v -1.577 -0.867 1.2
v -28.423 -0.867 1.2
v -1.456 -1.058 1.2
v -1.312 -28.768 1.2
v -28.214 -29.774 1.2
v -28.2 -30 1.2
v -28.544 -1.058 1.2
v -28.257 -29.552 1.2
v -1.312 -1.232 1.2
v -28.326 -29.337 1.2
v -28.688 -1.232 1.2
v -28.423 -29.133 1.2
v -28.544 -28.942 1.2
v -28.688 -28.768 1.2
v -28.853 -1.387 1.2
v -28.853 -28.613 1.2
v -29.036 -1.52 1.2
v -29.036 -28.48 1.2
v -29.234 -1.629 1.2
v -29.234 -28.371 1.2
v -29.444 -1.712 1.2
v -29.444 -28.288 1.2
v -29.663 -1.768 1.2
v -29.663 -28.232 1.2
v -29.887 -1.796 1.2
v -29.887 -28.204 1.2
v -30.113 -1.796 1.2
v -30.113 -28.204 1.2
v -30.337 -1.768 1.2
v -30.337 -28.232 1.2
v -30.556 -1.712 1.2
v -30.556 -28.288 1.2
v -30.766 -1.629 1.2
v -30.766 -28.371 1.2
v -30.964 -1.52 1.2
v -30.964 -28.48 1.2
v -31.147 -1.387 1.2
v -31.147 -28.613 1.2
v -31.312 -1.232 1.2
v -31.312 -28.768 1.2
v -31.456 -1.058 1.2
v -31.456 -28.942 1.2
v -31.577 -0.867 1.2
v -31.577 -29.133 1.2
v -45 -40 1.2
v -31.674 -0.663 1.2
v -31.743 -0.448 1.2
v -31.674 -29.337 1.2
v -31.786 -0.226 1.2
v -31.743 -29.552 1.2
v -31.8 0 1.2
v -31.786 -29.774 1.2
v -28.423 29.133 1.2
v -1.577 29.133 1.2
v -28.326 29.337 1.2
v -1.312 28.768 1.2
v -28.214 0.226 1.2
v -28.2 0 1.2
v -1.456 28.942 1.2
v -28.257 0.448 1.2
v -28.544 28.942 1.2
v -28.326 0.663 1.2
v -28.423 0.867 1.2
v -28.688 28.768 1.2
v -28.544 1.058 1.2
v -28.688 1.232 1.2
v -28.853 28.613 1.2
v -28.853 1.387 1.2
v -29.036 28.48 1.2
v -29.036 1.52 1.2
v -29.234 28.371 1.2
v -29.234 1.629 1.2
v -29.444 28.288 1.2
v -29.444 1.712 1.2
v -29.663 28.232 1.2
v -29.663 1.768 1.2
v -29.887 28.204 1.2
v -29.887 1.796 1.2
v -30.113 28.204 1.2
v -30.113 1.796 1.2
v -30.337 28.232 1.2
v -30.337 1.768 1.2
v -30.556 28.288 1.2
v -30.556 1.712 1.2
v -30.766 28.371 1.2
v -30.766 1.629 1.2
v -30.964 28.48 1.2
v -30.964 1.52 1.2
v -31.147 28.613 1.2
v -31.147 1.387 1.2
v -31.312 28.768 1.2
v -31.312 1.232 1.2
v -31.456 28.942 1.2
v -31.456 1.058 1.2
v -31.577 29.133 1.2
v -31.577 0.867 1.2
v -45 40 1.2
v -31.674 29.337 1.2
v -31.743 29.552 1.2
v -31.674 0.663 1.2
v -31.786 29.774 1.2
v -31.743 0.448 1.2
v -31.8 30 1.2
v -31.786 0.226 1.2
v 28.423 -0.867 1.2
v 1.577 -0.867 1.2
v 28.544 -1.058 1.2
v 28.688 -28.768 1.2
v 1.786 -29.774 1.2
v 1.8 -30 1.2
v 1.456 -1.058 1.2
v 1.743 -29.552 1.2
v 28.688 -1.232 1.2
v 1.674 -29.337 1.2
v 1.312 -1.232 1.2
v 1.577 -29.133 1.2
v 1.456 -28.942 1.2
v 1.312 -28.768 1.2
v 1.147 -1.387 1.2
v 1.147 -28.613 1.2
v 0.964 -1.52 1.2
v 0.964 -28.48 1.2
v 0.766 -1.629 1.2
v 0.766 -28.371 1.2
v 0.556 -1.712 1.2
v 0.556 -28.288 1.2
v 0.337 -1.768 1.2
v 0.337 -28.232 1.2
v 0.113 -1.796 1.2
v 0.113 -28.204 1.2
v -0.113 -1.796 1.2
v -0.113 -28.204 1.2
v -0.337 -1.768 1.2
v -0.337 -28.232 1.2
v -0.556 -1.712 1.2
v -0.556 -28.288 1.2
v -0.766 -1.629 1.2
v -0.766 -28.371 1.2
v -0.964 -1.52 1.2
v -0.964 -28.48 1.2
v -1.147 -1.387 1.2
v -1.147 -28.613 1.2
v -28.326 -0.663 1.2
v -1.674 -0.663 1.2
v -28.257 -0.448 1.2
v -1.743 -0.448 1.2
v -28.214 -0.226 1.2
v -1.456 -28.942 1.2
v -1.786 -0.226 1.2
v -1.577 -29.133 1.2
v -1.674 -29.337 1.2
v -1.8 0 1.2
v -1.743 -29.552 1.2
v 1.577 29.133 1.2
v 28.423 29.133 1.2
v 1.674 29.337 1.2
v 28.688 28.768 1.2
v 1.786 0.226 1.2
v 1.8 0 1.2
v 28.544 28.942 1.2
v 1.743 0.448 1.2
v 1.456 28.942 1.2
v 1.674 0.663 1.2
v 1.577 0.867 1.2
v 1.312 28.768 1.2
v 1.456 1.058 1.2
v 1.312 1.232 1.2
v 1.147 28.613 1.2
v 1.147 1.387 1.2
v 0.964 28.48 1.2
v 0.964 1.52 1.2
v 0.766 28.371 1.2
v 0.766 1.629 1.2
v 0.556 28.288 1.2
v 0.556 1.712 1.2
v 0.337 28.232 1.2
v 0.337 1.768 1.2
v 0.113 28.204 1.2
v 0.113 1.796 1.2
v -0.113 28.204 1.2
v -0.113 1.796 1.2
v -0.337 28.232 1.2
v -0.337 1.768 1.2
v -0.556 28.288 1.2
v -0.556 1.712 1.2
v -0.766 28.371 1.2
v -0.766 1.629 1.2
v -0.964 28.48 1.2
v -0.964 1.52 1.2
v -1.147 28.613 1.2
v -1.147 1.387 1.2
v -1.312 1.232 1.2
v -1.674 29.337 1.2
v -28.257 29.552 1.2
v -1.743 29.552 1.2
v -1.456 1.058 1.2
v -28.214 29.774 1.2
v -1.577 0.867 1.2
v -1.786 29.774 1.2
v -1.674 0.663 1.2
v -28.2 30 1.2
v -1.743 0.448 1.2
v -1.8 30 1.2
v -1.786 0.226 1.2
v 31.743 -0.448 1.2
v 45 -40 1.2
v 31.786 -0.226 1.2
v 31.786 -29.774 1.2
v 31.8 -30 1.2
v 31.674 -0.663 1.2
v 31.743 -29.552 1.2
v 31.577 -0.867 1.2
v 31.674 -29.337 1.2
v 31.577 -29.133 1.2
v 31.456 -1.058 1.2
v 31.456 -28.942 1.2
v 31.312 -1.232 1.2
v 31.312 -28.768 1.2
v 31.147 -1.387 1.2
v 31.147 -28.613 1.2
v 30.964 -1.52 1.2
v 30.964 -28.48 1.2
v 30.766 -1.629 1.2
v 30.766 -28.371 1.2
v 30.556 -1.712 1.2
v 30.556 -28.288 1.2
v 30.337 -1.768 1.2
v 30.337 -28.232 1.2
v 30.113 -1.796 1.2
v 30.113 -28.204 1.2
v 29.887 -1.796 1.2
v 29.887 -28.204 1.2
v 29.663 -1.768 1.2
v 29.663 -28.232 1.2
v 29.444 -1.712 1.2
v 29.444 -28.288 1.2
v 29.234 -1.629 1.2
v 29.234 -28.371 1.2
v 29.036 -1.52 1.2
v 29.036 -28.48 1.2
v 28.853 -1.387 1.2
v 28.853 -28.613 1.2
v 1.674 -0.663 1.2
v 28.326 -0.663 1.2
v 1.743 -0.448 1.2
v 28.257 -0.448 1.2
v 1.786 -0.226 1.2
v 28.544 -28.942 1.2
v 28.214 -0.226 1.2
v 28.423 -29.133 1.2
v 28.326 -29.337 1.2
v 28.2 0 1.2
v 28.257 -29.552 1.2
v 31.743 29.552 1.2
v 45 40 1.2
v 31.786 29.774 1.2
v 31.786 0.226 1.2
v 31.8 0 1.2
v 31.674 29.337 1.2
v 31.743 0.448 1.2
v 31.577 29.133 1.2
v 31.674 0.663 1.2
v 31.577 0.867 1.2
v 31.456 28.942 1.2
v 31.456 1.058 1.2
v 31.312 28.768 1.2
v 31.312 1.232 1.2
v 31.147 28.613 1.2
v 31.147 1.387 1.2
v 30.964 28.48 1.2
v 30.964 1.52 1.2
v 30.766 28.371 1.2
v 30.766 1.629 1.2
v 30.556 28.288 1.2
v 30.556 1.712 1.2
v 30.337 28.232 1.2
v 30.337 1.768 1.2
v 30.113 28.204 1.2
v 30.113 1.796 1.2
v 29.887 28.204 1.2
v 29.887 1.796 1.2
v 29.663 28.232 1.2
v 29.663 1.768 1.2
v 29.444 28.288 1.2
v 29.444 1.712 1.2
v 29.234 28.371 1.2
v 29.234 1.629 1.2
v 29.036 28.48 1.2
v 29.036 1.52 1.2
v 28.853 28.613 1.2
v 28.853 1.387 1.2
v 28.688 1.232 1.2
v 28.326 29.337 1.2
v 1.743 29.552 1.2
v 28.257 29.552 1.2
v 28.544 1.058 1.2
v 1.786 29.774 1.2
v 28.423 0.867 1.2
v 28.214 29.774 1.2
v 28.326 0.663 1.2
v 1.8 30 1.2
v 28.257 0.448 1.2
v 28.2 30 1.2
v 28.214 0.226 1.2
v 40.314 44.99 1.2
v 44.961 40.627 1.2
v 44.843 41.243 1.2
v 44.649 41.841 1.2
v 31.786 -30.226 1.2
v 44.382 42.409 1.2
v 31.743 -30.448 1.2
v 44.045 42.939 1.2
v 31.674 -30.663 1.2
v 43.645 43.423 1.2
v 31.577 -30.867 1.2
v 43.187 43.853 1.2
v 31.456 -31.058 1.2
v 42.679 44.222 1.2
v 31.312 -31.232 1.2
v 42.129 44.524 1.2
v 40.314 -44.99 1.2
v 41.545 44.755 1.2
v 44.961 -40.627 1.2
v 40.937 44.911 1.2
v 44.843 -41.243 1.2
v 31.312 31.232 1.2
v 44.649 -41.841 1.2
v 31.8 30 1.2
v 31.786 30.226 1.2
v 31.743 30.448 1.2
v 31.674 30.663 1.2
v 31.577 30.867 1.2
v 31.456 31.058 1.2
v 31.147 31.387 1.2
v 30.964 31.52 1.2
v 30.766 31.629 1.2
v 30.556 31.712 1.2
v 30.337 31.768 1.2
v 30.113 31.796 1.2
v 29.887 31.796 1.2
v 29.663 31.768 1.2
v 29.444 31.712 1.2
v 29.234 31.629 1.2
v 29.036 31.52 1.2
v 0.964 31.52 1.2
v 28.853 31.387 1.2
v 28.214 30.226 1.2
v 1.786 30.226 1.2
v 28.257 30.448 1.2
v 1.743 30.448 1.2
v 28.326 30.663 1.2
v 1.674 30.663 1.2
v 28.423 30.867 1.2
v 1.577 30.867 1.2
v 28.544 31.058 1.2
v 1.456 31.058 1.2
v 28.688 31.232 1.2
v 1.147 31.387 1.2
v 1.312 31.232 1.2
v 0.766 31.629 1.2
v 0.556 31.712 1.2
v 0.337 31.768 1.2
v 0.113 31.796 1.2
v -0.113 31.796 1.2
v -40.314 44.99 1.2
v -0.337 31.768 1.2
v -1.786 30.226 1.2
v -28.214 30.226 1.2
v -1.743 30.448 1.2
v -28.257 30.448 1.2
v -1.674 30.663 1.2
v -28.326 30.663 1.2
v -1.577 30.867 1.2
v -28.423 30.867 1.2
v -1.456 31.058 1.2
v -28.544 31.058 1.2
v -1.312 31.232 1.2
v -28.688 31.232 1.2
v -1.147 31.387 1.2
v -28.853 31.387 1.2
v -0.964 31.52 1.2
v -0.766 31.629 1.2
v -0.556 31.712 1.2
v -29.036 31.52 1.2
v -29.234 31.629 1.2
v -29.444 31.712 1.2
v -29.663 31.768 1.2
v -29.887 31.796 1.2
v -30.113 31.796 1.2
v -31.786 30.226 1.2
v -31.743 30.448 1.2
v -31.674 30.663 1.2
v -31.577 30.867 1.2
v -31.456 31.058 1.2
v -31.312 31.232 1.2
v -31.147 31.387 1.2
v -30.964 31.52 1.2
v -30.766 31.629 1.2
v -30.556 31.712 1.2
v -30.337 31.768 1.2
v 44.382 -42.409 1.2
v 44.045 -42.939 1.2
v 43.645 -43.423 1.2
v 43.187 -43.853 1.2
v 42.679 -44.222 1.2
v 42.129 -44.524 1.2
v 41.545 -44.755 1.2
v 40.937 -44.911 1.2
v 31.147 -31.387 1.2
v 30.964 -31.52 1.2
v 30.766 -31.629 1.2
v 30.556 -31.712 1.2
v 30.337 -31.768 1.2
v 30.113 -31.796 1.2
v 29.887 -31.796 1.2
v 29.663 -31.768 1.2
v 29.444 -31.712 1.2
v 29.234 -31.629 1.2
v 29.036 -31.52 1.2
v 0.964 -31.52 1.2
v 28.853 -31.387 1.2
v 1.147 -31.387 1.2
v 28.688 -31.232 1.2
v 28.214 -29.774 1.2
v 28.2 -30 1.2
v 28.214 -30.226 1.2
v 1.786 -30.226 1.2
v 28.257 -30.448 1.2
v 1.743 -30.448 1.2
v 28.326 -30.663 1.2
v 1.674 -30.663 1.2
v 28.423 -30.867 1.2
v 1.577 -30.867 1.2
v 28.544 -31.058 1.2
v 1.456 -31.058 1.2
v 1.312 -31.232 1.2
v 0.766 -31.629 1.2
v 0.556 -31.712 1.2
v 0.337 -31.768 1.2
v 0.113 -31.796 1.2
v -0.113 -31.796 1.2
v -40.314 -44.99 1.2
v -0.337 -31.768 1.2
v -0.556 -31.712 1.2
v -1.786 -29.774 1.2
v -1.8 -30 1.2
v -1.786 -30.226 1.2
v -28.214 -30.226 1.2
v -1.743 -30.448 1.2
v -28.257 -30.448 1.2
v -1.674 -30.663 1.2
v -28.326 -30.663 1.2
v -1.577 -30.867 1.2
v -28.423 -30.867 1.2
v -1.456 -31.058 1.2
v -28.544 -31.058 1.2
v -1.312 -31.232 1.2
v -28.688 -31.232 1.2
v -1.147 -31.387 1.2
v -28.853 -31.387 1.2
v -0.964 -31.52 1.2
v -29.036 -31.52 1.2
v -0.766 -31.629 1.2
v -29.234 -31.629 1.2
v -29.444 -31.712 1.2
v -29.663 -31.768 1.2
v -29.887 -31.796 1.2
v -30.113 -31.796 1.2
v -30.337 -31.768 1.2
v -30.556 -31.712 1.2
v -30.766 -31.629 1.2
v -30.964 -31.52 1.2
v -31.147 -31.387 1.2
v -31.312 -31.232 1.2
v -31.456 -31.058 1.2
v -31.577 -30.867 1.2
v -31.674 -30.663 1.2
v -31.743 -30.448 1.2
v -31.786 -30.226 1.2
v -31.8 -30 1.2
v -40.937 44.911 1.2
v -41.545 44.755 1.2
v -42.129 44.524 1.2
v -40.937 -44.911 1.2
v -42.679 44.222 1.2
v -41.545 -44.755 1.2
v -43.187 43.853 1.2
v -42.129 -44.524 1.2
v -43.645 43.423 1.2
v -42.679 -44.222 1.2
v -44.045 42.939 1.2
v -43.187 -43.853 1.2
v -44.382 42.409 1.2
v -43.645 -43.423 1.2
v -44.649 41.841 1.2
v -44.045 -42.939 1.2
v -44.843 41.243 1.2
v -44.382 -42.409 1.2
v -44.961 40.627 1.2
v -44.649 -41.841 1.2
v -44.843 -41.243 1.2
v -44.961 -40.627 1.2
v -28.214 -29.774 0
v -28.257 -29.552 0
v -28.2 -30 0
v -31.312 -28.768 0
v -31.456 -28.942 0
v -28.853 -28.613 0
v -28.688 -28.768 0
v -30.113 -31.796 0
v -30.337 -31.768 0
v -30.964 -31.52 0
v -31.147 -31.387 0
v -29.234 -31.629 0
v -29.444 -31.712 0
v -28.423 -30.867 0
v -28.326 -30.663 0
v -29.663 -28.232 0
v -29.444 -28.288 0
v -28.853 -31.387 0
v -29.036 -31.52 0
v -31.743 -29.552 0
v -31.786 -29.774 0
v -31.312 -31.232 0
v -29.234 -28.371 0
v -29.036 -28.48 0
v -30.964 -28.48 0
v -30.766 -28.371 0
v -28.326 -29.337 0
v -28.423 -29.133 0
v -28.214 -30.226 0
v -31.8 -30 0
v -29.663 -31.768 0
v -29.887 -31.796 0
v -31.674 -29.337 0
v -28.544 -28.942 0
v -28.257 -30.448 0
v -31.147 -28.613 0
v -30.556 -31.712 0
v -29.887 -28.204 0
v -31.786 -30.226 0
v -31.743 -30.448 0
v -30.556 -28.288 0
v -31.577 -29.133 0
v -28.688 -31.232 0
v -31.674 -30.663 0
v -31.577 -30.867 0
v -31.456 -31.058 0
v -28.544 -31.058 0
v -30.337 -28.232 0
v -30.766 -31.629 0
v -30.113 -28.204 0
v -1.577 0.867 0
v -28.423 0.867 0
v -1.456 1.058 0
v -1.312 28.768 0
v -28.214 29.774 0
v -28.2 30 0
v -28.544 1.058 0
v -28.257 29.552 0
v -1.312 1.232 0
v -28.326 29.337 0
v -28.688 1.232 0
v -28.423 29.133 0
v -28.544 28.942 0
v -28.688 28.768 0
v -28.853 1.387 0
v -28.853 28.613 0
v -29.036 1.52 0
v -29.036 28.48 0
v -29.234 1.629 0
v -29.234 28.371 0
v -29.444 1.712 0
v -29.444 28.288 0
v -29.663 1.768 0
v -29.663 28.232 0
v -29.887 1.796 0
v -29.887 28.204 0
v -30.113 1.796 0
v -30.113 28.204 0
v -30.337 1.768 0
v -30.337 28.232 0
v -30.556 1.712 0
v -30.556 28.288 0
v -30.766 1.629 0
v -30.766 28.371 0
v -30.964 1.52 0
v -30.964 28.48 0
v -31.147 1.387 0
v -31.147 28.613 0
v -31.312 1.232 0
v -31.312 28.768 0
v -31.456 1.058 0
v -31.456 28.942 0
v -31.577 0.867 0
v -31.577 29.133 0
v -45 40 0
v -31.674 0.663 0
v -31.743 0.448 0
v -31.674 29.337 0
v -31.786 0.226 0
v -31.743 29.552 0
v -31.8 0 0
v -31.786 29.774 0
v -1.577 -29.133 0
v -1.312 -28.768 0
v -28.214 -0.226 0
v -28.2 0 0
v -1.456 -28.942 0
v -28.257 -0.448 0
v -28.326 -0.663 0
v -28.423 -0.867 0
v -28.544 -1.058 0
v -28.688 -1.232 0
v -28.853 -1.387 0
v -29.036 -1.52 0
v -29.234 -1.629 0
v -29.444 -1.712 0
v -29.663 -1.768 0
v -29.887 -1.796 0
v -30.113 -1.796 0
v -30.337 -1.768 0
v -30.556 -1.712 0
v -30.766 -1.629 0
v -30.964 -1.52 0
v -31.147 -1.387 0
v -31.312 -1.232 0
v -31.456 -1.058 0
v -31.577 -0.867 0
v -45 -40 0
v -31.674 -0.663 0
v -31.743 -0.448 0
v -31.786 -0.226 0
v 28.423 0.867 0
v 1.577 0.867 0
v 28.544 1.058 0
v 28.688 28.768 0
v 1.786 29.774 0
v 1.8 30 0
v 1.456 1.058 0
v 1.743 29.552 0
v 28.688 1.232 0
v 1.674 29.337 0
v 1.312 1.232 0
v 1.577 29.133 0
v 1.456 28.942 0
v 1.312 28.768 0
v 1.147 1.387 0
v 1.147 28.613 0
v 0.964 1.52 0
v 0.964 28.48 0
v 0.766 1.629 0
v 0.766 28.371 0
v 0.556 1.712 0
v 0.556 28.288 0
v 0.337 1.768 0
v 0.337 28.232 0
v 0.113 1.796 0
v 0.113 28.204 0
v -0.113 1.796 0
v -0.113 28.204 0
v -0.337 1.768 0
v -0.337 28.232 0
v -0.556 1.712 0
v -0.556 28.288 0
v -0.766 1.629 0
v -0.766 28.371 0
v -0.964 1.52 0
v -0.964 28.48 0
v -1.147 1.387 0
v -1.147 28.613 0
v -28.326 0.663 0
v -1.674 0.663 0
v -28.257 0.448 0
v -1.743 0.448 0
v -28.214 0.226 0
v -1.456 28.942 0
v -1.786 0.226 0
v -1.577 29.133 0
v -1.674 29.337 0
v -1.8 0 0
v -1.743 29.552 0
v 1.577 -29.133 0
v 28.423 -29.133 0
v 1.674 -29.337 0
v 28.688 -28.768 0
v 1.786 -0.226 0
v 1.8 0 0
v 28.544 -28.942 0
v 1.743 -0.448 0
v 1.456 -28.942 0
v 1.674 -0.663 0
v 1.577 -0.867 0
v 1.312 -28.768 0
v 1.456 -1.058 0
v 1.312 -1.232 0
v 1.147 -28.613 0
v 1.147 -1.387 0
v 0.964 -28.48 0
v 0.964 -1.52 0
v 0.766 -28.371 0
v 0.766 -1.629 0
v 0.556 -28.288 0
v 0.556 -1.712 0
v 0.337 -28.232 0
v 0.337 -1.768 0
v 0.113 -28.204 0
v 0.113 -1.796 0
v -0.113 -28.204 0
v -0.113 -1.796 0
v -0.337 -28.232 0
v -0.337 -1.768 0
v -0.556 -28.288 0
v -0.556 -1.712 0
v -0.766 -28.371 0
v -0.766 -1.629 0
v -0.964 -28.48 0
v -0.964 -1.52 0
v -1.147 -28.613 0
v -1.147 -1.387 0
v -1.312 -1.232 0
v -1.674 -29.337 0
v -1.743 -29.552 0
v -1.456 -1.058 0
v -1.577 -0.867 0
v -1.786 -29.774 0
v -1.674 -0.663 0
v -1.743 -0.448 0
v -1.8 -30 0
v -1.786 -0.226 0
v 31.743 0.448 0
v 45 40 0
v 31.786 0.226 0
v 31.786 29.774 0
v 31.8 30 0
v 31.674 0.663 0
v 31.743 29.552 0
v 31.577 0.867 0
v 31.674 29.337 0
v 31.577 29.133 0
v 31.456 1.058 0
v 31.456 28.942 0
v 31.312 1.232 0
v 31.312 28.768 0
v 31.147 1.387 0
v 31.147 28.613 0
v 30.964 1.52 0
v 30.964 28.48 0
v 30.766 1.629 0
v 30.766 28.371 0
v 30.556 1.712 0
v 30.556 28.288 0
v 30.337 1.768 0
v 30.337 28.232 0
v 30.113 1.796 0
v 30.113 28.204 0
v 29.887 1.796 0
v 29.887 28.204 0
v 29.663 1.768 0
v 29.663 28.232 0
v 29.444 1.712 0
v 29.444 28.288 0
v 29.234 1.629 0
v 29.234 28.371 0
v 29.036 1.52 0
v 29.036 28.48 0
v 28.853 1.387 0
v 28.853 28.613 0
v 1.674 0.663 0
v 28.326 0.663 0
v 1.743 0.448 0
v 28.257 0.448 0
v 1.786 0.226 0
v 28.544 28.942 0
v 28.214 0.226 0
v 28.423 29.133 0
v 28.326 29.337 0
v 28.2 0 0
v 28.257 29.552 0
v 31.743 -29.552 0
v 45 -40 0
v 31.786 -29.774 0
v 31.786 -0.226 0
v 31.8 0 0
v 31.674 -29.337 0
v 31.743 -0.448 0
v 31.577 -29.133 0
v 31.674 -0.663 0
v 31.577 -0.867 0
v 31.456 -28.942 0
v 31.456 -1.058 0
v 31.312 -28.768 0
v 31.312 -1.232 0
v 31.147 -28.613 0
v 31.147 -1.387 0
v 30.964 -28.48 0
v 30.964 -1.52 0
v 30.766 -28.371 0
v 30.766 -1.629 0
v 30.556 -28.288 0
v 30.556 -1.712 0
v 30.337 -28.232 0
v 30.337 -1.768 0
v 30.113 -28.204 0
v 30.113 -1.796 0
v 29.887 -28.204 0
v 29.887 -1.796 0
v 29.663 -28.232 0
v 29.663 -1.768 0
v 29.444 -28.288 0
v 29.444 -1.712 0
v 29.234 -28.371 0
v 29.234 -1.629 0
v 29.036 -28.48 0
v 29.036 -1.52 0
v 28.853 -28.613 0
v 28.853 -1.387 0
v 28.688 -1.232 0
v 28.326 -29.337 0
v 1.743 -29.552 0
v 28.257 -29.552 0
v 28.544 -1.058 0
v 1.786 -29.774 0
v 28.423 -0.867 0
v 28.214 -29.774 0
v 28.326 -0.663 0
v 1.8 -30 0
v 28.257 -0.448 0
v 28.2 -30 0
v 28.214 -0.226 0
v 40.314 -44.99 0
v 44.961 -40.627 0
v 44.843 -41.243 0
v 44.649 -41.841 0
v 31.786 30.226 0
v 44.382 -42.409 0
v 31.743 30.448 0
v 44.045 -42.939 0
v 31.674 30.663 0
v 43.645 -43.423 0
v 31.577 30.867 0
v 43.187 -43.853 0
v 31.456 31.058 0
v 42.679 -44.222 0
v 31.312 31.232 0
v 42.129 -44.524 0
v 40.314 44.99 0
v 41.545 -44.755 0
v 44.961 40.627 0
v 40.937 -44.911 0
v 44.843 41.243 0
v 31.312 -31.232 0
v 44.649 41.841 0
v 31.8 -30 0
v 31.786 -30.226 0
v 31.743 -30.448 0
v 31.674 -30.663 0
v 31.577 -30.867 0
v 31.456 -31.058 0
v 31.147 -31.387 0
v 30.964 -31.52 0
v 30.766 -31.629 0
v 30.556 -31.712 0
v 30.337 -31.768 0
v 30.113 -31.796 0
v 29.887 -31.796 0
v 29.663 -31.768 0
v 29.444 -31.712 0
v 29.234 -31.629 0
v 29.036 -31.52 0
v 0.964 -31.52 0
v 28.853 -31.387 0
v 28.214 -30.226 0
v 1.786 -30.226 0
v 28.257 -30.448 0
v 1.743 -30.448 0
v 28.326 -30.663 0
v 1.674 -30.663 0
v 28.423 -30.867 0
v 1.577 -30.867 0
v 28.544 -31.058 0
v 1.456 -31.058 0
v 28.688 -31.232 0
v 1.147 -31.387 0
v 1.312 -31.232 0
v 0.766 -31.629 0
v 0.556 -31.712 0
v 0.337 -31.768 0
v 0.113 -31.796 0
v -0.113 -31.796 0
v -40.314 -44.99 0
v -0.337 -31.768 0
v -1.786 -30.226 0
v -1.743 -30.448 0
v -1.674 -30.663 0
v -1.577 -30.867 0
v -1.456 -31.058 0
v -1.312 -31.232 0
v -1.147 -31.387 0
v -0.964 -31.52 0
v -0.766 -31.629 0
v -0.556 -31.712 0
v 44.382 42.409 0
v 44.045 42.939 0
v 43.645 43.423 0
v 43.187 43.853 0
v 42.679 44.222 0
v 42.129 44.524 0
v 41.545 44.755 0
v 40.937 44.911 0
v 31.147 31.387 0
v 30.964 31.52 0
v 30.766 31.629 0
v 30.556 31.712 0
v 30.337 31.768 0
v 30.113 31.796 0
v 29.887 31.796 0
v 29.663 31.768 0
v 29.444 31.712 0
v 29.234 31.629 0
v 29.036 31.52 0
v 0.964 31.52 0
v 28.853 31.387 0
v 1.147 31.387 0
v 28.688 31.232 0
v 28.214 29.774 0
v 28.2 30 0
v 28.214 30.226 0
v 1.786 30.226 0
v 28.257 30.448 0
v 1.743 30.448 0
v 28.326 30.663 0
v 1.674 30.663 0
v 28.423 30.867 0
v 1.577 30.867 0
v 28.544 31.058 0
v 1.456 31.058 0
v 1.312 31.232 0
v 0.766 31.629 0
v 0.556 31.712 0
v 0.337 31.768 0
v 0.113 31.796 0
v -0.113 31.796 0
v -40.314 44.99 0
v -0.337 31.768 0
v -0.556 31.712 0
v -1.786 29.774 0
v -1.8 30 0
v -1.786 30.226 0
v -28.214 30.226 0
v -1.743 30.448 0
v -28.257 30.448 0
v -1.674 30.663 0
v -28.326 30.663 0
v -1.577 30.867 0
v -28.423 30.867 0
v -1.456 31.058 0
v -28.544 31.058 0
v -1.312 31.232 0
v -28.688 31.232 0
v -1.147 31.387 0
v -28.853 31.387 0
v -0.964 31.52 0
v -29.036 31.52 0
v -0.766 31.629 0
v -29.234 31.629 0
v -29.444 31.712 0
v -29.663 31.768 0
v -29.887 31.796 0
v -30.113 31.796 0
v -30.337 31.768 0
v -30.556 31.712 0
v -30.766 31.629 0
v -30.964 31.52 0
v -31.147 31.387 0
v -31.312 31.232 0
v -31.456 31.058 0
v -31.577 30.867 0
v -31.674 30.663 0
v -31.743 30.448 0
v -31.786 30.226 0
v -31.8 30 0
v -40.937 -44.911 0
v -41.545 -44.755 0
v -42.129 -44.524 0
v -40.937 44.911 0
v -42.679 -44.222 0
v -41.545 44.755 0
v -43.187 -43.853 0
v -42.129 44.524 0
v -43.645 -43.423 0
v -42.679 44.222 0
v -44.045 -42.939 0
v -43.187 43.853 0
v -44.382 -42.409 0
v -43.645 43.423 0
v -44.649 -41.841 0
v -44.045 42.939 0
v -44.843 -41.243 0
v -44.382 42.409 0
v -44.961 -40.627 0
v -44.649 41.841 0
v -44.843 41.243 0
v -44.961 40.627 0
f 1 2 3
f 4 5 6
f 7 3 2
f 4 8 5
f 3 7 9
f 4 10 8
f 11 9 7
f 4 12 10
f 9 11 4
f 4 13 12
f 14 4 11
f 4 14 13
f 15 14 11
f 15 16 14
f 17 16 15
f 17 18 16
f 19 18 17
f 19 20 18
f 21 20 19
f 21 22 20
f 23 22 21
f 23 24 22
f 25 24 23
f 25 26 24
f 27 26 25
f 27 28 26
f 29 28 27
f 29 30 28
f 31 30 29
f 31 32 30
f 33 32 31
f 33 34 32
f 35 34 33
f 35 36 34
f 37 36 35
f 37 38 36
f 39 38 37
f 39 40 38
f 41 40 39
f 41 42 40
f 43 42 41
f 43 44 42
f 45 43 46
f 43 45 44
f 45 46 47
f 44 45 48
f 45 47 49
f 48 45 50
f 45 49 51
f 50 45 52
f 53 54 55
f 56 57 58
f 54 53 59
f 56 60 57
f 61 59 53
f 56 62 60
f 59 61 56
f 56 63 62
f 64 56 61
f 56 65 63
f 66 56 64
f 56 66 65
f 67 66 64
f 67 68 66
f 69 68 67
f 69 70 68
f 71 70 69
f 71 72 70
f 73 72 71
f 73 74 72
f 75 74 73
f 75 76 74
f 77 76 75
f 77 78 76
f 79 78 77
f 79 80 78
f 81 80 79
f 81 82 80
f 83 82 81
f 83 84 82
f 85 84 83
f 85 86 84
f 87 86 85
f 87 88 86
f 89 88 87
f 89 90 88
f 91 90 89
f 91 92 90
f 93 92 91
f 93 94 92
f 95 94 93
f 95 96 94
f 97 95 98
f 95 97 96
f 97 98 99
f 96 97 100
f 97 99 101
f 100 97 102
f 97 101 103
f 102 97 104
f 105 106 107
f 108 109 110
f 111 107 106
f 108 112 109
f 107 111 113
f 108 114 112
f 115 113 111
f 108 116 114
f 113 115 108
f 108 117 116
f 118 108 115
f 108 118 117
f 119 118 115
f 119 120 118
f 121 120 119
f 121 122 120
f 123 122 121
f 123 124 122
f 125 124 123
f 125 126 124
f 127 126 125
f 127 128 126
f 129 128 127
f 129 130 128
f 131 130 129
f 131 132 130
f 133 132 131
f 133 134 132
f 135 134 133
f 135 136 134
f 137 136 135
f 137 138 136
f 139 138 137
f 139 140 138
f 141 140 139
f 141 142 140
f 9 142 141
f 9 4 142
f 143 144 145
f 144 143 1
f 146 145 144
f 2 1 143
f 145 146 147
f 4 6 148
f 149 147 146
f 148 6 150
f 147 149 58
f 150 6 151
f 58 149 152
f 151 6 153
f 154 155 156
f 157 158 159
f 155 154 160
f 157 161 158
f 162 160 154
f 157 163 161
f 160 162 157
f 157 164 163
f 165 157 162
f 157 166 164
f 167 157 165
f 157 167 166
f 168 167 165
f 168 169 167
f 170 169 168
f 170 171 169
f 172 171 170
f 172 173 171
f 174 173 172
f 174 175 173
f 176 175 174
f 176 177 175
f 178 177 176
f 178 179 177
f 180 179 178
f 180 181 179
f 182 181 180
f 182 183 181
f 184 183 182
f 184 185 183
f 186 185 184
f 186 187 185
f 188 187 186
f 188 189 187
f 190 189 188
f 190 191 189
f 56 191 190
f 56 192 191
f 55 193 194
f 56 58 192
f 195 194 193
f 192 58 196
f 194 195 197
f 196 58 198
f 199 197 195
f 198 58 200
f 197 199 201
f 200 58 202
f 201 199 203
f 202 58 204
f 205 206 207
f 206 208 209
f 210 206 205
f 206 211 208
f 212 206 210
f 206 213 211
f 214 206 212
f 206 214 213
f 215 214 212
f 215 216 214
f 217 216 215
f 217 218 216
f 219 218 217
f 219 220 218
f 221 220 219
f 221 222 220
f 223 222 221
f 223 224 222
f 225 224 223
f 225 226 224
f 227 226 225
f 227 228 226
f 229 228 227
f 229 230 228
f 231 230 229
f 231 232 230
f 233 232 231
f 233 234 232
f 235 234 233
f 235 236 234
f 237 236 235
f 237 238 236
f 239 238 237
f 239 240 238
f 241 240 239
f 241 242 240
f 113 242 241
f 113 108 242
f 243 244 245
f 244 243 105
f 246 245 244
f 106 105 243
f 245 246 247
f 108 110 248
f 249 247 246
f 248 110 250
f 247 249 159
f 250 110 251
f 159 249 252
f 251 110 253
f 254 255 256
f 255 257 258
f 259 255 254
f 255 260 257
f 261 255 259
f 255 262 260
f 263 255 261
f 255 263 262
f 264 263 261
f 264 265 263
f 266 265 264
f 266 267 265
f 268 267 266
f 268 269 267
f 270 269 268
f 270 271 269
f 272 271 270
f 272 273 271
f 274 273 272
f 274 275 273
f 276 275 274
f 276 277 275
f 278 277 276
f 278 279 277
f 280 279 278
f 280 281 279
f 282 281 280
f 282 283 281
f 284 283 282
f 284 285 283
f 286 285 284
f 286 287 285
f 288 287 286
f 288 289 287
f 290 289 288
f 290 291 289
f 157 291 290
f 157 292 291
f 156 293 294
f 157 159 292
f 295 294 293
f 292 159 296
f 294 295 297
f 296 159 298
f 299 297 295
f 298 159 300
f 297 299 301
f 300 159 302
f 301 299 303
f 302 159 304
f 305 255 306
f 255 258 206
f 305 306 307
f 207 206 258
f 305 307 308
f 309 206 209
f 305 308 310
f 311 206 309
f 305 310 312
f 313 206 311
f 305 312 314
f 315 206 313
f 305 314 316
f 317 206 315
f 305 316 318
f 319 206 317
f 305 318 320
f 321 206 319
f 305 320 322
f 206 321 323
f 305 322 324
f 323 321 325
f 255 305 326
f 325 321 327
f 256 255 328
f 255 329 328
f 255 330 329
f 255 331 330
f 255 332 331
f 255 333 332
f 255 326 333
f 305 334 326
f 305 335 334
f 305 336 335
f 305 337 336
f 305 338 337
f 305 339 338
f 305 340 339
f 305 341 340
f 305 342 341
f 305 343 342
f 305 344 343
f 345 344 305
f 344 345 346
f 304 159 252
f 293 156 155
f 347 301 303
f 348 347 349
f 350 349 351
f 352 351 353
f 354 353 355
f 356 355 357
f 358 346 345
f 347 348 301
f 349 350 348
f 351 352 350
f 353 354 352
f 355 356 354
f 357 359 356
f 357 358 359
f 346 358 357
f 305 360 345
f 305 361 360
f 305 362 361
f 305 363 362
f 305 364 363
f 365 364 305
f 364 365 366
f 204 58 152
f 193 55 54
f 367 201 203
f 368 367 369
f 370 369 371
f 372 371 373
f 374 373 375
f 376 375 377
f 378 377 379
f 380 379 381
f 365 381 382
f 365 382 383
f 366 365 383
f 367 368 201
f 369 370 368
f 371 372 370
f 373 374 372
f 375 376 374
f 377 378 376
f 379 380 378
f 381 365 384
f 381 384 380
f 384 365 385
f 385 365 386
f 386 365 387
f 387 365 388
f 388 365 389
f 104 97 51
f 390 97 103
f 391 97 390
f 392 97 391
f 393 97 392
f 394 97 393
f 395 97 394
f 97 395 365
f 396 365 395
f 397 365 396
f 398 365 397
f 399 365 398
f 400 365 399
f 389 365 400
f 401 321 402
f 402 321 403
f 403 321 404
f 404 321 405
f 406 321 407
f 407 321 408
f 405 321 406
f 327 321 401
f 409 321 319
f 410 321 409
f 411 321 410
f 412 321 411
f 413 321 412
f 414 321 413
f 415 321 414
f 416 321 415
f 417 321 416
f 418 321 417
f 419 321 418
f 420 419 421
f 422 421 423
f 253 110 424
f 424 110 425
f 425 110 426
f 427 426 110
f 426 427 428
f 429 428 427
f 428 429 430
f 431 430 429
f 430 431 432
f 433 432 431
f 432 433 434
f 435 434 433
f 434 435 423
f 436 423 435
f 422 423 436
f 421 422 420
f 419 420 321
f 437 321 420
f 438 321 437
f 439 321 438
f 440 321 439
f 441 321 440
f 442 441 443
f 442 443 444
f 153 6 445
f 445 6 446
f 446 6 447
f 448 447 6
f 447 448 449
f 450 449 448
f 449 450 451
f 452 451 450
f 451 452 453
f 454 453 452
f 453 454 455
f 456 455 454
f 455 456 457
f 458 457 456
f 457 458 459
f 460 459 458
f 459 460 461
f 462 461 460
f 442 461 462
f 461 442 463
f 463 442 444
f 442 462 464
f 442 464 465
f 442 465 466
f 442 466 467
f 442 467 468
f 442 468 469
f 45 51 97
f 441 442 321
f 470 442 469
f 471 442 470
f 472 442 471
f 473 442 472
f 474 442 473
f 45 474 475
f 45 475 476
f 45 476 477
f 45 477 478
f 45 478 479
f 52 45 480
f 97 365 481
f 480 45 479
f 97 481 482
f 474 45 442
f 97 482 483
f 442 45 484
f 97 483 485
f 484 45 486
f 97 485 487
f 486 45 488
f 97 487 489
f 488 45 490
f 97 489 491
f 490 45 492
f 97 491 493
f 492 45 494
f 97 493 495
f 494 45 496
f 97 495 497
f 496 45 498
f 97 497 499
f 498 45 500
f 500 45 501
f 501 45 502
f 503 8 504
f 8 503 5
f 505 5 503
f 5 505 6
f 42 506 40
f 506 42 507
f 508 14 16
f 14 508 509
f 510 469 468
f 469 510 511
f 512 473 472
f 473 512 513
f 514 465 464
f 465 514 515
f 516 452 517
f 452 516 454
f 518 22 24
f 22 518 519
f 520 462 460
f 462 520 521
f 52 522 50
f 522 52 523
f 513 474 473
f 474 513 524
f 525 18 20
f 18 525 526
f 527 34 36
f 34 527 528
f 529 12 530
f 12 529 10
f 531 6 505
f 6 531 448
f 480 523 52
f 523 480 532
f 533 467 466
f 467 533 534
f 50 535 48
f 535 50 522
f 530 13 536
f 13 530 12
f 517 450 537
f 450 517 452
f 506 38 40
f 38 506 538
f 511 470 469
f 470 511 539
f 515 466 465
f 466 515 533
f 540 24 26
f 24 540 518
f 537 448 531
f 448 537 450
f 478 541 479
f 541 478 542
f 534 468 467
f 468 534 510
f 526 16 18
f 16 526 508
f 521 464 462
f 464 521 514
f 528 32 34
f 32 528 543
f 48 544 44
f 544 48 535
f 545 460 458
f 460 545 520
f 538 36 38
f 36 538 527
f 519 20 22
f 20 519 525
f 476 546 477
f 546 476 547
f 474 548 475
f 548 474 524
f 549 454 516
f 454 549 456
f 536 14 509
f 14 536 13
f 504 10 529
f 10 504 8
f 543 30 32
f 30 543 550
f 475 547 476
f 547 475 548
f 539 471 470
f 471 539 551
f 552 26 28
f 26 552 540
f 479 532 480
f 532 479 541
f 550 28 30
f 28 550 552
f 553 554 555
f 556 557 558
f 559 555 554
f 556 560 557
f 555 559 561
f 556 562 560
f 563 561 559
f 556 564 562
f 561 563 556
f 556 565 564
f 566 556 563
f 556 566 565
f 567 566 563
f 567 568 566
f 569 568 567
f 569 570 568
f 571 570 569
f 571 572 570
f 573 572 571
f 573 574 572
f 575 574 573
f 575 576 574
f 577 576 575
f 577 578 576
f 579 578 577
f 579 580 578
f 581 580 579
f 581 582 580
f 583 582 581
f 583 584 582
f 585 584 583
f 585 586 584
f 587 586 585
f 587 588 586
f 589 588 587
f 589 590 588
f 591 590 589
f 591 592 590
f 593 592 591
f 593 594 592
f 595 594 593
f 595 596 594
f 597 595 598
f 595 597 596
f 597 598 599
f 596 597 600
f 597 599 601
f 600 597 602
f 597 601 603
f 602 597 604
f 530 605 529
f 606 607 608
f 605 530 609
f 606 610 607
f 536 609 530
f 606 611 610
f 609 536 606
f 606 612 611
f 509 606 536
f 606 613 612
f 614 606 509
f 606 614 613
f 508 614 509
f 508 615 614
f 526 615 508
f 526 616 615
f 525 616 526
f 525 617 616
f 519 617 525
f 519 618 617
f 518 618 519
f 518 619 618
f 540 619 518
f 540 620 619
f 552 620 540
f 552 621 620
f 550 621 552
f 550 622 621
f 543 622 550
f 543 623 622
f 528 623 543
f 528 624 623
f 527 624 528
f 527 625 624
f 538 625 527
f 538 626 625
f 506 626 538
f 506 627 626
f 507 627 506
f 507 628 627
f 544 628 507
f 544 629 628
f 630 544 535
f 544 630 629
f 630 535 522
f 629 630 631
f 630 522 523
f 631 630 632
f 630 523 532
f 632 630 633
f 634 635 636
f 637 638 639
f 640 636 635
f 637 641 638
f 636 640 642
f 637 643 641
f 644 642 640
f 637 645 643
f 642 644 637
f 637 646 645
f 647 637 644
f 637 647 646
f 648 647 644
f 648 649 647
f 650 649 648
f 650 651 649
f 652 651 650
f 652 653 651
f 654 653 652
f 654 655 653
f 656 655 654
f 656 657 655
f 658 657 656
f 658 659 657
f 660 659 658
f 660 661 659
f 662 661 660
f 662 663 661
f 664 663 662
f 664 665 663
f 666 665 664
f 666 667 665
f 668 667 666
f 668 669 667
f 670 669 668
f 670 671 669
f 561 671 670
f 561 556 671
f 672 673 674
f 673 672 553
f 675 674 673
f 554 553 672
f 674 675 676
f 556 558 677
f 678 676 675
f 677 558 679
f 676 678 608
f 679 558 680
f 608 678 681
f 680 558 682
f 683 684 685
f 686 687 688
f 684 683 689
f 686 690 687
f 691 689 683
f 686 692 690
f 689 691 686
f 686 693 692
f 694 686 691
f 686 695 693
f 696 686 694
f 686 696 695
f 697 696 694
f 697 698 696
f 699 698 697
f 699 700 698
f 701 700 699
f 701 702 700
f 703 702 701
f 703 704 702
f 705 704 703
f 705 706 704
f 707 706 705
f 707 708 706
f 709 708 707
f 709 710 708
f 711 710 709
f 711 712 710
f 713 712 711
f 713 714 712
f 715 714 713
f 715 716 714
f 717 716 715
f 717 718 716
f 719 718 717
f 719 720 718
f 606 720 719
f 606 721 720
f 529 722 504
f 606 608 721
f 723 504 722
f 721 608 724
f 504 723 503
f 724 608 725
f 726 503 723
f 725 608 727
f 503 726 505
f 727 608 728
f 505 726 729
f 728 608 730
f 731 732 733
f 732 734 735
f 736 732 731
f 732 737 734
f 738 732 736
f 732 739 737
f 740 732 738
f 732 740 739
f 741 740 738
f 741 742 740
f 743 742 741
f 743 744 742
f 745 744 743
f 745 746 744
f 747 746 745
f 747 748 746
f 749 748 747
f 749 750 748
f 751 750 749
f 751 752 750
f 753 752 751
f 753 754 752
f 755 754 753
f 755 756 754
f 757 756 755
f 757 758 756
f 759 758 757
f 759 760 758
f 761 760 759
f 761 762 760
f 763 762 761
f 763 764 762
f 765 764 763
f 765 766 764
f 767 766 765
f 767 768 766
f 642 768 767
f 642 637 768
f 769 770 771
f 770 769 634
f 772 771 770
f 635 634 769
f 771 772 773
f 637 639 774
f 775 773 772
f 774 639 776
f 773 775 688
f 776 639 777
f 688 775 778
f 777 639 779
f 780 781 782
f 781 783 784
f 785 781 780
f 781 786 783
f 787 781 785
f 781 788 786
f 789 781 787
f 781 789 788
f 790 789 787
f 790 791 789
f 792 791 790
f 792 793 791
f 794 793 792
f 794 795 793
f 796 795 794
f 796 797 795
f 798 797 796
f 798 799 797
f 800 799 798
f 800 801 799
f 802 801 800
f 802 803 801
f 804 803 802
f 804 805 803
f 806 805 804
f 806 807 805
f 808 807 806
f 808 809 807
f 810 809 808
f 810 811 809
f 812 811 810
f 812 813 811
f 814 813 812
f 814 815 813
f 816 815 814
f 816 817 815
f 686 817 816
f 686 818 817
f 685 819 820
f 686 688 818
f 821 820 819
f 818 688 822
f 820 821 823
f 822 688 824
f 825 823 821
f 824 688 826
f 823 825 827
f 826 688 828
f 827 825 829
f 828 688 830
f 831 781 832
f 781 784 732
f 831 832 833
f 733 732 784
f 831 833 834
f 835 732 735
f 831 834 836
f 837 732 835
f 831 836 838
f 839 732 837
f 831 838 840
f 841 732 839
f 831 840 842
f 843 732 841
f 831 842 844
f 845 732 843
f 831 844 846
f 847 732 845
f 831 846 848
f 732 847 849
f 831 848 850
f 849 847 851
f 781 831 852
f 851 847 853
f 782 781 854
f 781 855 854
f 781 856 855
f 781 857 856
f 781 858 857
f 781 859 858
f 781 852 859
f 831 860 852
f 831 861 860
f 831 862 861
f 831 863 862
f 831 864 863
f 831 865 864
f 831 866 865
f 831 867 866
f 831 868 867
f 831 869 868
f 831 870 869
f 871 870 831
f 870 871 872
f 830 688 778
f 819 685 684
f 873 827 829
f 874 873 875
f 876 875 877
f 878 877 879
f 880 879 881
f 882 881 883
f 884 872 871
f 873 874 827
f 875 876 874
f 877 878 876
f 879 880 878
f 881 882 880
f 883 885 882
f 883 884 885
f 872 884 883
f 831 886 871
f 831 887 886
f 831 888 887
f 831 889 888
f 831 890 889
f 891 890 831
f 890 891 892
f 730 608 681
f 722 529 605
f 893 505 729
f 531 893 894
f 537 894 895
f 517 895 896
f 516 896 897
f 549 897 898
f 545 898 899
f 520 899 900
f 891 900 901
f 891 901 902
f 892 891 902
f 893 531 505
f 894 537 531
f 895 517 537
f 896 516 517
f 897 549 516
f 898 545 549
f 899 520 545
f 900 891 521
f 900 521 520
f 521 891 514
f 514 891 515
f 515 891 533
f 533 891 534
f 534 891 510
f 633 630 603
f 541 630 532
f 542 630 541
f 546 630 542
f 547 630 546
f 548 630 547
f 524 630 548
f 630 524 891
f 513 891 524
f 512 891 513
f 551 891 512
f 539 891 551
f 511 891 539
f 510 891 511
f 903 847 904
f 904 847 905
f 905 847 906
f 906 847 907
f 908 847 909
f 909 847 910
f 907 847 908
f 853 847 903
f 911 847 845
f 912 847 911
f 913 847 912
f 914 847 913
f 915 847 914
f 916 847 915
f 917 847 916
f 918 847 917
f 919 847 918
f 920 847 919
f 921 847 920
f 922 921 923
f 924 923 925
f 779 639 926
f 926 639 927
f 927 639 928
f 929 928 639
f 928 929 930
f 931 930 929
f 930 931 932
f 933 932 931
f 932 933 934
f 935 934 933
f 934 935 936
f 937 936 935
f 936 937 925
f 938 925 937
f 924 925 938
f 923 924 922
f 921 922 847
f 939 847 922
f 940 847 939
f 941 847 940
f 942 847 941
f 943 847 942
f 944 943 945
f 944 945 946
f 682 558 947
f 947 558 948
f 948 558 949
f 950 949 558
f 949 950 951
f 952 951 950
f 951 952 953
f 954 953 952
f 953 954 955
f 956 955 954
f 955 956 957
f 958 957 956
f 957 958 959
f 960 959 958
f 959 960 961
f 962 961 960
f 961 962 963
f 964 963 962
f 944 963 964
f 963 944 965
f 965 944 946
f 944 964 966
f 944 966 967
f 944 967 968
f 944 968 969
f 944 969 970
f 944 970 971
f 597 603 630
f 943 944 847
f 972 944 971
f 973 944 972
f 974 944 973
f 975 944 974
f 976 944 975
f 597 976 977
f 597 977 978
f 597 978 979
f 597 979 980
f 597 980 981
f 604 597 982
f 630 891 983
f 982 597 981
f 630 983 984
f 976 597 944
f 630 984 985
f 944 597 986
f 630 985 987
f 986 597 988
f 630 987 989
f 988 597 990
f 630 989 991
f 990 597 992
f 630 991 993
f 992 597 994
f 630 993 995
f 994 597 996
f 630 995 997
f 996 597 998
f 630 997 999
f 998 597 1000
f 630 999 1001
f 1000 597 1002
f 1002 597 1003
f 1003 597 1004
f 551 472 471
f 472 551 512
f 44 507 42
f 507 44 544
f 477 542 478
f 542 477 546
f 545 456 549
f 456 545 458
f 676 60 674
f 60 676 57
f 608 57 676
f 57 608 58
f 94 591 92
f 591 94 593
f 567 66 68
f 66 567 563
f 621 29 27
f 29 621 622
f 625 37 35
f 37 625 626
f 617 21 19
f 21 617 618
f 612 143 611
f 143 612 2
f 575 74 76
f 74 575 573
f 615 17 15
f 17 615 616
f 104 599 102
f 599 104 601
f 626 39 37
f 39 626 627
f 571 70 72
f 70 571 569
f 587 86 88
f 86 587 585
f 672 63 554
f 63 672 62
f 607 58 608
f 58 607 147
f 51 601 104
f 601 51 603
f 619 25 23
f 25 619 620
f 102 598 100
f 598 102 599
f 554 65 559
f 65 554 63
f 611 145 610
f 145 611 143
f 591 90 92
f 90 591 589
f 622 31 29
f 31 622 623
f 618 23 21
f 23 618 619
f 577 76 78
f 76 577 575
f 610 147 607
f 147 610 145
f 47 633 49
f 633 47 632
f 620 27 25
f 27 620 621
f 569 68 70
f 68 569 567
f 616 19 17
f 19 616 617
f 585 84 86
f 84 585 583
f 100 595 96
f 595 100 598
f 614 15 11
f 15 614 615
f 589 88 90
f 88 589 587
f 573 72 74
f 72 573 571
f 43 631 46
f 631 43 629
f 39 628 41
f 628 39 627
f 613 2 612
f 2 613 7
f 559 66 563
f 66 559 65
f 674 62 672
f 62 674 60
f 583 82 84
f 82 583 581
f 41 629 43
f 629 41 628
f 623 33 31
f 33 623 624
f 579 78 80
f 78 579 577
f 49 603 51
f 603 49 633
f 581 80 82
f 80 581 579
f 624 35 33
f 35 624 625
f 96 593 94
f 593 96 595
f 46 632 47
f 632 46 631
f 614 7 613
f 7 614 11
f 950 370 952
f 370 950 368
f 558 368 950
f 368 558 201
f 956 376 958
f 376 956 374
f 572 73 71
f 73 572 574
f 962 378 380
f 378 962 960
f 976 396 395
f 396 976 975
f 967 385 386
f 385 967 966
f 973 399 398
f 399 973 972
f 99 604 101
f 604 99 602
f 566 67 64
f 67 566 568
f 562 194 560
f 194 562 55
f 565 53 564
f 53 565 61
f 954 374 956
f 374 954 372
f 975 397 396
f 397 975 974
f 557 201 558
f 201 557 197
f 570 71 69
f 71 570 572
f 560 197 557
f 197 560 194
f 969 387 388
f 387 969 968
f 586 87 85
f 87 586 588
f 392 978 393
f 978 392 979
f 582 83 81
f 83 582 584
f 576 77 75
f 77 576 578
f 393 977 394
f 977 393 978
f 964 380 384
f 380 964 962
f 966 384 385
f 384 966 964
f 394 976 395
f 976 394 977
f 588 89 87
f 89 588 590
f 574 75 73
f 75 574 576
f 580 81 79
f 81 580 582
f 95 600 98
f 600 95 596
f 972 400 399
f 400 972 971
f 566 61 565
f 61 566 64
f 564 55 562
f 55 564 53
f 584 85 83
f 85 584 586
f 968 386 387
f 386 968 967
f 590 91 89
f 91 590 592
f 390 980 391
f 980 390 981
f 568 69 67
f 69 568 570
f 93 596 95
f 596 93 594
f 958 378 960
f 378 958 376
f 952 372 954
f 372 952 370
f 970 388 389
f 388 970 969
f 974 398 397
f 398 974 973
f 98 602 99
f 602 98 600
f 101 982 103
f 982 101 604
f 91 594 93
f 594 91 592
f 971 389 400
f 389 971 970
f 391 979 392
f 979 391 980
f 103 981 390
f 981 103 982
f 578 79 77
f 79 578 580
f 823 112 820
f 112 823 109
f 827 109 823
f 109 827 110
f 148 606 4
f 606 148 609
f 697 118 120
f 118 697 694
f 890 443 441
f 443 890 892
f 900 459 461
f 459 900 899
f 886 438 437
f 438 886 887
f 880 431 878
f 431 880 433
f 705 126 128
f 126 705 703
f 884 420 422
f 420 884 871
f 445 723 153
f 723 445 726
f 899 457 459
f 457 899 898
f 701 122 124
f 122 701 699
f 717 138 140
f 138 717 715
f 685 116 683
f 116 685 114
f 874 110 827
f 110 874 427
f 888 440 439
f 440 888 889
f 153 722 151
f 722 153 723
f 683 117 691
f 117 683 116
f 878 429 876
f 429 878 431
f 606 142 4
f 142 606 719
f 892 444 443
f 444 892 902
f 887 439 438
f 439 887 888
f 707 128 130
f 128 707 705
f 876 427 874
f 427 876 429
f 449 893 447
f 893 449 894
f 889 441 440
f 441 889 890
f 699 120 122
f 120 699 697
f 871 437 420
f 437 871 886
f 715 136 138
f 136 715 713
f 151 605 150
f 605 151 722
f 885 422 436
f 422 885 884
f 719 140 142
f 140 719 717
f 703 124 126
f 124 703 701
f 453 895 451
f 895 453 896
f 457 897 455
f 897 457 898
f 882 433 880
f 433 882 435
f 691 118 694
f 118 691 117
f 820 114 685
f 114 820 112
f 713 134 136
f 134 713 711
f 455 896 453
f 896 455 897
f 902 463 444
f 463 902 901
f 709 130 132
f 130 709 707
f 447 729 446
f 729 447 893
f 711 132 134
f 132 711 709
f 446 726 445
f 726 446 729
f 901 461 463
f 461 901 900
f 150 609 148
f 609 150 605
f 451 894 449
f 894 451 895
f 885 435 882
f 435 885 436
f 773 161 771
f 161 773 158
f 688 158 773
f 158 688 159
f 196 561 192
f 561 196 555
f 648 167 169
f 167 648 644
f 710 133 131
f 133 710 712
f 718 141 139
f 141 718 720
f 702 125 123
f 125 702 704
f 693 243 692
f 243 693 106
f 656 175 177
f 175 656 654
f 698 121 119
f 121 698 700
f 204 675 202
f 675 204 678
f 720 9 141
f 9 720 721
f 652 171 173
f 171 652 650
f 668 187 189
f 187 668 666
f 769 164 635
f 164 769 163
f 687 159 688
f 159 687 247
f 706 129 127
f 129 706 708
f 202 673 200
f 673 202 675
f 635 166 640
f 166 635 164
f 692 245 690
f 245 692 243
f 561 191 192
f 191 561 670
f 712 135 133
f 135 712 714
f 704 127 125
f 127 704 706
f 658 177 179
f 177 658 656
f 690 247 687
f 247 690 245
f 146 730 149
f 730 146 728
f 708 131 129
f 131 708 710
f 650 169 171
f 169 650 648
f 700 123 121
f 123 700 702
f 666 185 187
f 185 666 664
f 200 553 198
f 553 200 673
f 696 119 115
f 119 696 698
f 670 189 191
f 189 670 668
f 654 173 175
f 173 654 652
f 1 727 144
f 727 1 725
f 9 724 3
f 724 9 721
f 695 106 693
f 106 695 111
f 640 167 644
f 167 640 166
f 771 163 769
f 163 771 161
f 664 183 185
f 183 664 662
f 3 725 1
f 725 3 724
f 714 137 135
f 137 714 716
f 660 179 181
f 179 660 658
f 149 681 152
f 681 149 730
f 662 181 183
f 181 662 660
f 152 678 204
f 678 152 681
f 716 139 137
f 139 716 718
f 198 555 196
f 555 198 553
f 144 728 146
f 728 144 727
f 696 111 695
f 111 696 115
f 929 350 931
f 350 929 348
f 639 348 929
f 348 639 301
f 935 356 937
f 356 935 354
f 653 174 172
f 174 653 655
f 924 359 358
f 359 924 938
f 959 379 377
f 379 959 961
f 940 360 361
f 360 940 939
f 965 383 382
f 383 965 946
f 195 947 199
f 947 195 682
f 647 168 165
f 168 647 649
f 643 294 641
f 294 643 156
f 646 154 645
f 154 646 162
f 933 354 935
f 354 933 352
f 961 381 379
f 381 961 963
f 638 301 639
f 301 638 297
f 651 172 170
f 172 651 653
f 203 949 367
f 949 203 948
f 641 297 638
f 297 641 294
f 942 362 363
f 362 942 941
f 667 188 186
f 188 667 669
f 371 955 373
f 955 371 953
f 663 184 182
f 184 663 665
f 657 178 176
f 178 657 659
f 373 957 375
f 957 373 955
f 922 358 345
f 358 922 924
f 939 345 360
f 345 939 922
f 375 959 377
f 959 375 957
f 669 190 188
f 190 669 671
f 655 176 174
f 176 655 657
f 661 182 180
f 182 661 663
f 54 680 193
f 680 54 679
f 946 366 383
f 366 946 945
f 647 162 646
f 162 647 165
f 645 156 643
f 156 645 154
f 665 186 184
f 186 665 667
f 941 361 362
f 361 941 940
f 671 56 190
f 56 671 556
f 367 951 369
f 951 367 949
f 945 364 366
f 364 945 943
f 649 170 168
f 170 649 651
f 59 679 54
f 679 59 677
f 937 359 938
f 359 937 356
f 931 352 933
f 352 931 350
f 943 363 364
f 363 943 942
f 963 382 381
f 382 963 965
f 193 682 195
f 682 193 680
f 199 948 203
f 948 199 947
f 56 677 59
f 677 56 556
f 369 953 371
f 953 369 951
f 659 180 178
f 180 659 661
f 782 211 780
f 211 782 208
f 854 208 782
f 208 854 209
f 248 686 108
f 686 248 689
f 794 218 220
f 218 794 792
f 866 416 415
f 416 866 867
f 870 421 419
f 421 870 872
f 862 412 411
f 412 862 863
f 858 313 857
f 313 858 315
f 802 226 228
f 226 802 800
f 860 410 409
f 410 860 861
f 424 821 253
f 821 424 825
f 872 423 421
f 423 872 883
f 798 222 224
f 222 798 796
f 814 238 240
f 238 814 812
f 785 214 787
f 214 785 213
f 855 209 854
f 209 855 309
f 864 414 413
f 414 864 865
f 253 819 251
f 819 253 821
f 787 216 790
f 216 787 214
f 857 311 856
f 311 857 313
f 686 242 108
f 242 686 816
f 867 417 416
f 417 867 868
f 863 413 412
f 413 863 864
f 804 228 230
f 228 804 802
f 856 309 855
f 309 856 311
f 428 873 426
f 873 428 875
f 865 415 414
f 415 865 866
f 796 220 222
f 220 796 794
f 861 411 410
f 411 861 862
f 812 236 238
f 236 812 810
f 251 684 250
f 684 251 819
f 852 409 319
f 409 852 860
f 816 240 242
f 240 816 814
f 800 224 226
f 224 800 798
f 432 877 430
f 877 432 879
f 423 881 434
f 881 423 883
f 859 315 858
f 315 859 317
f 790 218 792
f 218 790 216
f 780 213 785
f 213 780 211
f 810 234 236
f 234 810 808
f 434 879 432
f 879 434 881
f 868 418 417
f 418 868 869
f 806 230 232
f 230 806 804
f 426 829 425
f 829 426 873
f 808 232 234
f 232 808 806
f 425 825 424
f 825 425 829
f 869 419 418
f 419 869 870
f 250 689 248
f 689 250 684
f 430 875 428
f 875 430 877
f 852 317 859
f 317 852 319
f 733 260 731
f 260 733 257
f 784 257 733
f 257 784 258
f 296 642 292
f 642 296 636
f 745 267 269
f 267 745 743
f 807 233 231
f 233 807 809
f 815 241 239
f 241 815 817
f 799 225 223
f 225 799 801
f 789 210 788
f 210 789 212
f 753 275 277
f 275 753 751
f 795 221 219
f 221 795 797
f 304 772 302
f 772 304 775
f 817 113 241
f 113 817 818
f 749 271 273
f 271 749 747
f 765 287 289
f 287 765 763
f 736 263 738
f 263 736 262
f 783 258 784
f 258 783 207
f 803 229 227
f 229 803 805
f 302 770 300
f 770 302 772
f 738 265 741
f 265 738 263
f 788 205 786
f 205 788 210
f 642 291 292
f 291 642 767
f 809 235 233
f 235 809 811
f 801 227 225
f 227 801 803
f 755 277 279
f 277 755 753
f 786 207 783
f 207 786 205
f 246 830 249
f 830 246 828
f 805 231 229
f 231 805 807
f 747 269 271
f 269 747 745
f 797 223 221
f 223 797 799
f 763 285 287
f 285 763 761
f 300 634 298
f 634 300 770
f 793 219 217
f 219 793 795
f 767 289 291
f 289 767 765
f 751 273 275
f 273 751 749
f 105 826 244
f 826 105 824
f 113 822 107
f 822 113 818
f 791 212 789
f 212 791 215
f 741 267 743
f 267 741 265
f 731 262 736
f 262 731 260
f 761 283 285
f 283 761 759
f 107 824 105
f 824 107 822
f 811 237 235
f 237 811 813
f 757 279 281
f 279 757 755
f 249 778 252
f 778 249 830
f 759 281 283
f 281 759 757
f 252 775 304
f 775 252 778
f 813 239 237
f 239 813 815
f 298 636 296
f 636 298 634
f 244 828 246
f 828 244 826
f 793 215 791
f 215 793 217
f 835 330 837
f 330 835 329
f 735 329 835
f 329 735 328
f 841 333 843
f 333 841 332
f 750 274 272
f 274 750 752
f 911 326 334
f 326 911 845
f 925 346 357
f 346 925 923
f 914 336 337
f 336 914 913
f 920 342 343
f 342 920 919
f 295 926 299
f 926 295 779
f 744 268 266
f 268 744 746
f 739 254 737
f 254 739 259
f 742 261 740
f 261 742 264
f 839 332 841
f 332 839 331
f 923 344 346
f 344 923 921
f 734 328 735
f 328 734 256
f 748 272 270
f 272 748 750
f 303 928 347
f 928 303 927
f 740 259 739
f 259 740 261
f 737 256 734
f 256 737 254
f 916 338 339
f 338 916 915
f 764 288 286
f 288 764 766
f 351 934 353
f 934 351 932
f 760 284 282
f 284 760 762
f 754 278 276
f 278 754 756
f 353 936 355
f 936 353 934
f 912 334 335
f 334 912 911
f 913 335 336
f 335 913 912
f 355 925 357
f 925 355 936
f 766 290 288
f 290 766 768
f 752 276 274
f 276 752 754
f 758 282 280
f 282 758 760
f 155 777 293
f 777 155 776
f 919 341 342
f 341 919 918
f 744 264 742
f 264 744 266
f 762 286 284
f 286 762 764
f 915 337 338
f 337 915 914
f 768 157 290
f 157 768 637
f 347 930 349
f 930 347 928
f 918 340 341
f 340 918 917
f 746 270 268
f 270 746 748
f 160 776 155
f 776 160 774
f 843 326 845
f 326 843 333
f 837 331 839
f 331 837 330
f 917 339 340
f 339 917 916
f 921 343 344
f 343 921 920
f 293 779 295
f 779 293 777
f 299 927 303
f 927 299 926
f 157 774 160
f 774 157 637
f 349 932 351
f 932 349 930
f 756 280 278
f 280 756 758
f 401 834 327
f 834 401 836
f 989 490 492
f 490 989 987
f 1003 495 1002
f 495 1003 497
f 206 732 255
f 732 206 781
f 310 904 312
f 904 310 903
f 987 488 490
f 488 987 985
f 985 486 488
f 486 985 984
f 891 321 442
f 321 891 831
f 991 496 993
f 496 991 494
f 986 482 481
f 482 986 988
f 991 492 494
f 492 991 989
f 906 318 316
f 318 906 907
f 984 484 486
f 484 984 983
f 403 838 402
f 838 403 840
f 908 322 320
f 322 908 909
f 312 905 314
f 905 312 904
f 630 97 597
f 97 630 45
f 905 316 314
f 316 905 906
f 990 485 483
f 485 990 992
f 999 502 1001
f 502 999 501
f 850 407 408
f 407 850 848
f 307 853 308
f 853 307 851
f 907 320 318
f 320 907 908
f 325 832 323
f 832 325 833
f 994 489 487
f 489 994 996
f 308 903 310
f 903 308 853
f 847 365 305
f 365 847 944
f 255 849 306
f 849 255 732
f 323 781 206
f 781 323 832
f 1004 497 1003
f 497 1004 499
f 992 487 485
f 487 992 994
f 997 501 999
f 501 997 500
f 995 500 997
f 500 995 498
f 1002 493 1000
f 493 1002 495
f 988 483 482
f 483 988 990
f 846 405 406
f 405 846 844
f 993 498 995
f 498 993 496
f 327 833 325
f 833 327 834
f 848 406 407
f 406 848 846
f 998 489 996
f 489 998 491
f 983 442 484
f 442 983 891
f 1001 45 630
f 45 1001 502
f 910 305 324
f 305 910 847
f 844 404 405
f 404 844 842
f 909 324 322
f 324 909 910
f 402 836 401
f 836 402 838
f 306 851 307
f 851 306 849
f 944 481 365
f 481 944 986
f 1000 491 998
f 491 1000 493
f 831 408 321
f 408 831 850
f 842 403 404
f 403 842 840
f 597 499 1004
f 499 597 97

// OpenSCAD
$fn = 50;


difference() {
	union() {
		hull() {
			translate(v = [-40.0000000000, 40.0000000000, 0]) {
				cylinder(h = 18, r = 5);
			}
			translate(v = [40.0000000000, 40.0000000000, 0]) {
				cylinder(h = 18, r = 5);
			}
			translate(v = [-40.0000000000, -40.0000000000, 0]) {
				cylinder(h = 18, r = 5);
			}
			translate(v = [40.0000000000, -40.0000000000, 0]) {
				cylinder(h = 18, r = 5);
			}
		}
	}
	union() {
		translate(v = [0, 0, 1.2000000000]) {
			hull() {
				translate(v = [-40.0000000000, 40.0000000000, 0]) {
					cylinder(h = 16.8000000000, r = 3.8000000000);
				}
				translate(v = [40.0000000000, 40.0000000000, 0]) {
					cylinder(h = 16.8000000000, r = 3.8000000000);
				}
				translate(v = [-40.0000000000, -40.0000000000, 0]) {
					cylinder(h = 16.8000000000, r = 3.8000000000);
				}
				translate(v = [40.0000000000, -40.0000000000, 0]) {
					cylinder(h = 16.8000000000, r = 3.8000000000);
				}
			}
		}
		#translate(v = [-30.0000000000, -30.0000000000, 0]) {
			cylinder(h = 1.2000000000, r = 1.8000000000);
		}
		#translate(v = [-30.0000000000, 0.0000000000, 0]) {
			cylinder(h = 1.2000000000, r = 1.8000000000);
		}
		#translate(v = [-30.0000000000, 30.0000000000, 0]) {
			cylinder(h = 1.2000000000, r = 1.8000000000);
		}
		#translate(v = [0.0000000000, -30.0000000000, 0]) {
			cylinder(h = 1.2000000000, r = 1.8000000000);
		}
		#cylinder(h = 1.2000000000, r = 1.8000000000);
		#translate(v = [0.0000000000, 30.0000000000, 0]) {
			cylinder(h = 1.2000000000, r = 1.8000000000);
		}
		#translate(v = [30.0000000000, -30.0000000000, 0]) {
			cylinder(h = 1.2000000000, r = 1.8000000000);
		}
		#translate(v = [30.0000000000, 0.0000000000, 0]) {
			cylinder(h = 1.2000000000, r = 1.8000000000);
		}
		#translate(v = [30.0000000000, 30.0000000000, 0]) {
			cylinder(h = 1.2000000000, r = 1.8000000000);
		}
		translate(v = [-250.0000000000, -250.0000000000, 1.2000000000]) {
			cube(size = [500, 500, 500]);
		}
		translate(v = [-250.0000000000, -250.0000000000, 1.2000000000]) {
			cube(size = [500, 500, 500]);
		}
		translate(v = [-250.0000000000, -250.0000000000, 1.2000000000]) {
			cube(size = [500, 500, 500]);
		}
	}
}
